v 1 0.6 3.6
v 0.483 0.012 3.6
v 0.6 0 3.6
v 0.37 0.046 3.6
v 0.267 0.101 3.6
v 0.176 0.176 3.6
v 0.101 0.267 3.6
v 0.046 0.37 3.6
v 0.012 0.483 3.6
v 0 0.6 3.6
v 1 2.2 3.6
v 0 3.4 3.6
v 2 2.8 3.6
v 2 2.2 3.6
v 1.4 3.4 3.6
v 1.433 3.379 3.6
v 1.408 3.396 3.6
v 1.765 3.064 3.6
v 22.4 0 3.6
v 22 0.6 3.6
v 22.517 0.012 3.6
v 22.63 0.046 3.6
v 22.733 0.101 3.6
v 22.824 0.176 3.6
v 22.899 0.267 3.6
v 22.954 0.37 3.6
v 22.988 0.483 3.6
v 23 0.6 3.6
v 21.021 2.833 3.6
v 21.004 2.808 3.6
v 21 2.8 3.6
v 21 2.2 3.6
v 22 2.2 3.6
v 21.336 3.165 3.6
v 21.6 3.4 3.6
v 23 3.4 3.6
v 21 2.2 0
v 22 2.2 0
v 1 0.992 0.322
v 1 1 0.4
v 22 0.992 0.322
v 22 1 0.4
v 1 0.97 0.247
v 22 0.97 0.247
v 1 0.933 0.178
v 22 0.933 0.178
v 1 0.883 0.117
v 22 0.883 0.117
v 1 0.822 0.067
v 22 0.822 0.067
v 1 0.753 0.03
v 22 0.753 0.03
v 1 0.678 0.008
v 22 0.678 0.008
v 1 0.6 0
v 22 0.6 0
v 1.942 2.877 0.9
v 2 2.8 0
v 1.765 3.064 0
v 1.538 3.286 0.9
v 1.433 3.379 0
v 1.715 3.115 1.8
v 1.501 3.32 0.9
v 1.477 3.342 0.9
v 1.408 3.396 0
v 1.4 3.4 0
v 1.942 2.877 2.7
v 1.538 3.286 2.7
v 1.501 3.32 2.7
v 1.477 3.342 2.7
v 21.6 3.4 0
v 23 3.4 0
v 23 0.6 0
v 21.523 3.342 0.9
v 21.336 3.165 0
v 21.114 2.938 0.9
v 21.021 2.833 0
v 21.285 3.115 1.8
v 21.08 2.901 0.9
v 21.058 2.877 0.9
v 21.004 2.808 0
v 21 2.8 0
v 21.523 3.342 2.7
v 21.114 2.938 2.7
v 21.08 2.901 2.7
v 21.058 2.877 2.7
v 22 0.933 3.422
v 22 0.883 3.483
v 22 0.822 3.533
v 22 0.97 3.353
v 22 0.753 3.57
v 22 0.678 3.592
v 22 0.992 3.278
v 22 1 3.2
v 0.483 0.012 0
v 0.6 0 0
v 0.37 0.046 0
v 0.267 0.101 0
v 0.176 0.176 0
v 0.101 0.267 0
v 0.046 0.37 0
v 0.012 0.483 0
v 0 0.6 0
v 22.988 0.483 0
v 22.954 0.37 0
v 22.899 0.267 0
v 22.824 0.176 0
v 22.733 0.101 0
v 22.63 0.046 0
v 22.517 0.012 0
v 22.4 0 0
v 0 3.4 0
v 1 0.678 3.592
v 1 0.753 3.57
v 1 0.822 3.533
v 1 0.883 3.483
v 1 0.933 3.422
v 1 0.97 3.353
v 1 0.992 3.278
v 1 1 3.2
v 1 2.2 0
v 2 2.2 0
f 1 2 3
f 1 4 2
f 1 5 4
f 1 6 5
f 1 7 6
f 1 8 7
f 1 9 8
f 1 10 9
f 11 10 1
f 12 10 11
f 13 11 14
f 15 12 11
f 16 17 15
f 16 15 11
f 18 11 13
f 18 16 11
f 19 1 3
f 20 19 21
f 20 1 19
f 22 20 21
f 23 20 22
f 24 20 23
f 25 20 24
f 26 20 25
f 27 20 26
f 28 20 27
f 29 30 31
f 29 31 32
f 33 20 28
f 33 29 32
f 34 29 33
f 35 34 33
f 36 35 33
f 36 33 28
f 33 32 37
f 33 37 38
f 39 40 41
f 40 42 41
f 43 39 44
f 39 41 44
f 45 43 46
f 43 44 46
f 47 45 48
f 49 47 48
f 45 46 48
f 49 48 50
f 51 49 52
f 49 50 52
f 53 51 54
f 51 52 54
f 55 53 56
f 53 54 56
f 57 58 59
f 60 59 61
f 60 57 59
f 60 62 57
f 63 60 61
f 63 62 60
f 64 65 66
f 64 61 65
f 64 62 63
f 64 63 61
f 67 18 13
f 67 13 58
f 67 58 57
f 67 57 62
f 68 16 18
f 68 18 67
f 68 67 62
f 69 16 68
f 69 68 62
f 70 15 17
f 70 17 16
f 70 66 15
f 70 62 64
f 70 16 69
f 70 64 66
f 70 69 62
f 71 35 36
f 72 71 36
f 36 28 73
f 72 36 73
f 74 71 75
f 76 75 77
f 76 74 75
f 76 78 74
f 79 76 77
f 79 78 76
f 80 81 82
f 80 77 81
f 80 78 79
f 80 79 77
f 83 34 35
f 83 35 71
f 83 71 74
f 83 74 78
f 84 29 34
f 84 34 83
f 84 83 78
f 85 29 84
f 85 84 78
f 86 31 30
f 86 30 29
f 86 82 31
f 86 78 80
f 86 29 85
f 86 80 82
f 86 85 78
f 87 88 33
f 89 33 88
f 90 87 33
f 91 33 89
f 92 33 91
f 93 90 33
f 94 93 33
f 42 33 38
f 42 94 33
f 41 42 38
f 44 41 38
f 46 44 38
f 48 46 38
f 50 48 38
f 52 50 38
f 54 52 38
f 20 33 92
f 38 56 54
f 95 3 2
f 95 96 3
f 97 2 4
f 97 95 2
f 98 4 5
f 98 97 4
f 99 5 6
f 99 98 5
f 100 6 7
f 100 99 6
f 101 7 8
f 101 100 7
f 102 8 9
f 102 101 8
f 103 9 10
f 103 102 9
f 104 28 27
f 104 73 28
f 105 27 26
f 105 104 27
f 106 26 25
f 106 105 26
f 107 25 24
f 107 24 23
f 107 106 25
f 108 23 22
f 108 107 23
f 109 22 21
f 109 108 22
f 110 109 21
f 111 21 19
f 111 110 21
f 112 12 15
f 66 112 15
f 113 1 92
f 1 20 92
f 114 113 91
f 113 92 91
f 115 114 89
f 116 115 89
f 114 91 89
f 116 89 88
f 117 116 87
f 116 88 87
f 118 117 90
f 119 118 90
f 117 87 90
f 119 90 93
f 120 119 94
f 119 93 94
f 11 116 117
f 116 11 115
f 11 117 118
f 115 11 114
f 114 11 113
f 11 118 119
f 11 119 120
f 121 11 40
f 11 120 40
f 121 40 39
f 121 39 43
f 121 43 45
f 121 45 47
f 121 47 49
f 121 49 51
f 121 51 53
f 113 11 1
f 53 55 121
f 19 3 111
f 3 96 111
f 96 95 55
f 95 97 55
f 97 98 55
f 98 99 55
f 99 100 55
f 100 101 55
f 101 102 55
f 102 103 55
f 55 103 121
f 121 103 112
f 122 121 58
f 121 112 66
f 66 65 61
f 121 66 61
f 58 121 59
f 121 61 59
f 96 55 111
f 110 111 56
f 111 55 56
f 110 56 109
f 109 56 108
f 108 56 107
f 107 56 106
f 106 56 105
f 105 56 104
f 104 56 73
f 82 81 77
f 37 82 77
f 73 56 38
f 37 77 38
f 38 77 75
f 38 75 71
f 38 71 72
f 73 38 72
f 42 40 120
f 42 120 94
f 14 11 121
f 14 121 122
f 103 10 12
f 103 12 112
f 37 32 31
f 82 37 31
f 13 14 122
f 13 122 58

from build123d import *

# Parameters (mm, degrees)
SKETCH1_W           = 23
SKETCH1_H           = 3.6
BOSS_EXTRUDE1_DEPTH = 1
SKETCH2_W           = 1
SKETCH2_H           = 3.6
BOSS_EXTRUDE2_DEPTH = 2.4
SKETCH3_W           = 1
SKETCH3_H           = 1.2
BOSS_EXTRUDE3_DEPTH = 3.6
FILLET1_SIZE        = 0.6
FILLET2_R           = 0.6
FILLET3_R           = 0.4


with BuildPart() as part:
    # Sketch1 → Boss-Extrude1 (new body)
    with BuildSketch(Plane(origin=(0, 0, 0), x_dir=(1, 0, 0), z_dir=(0, 1, 0))):
        with Locations((11.5, -1.8)):
            Rectangle(SKETCH1_W, SKETCH1_H)
    extrude(amount=BOSS_EXTRUDE1_DEPTH)

    # Sketch2 → Boss-Extrude2 (add)
    with BuildSketch(Plane(origin=(0, 1, 0), x_dir=(1, 0, 0), z_dir=(0, 1, 0))):
        with Locations((0.5, -1.8)):
            Rectangle(SKETCH2_W, SKETCH2_H)
        with Locations((22.5, -1.8)):
            Rectangle(SKETCH2_W, SKETCH2_H)
    extrude(amount=BOSS_EXTRUDE2_DEPTH)

    # Sketch3 → Boss-Extrude3 (add)
    with BuildSketch(Plane.XY.offset(3.6)):
        with Locations((1.5, 2.8)):
            Rectangle(SKETCH3_W, SKETCH3_H)
        with Locations((21.5, 2.8)):
            Rectangle(SKETCH3_W, SKETCH3_H)
    extrude(amount=-BOSS_EXTRUDE3_DEPTH)

    # Fillet1
    # a fillet whose section is not a circle: 0.6 mm, written as the material it takes off along each edge
    with BuildSketch(Plane(origin=(21, 3.4, 5.1), x_dir=(1, 0, 0), z_dir=(0, 0, -1)), Plane(origin=(2, 3.4, 5.1), x_dir=(0, -1, 0), z_dir=(0, 0, -1))) as fillet1_piece_1:
        with BuildLine():
            Bezier((FILLET1_SIZE, 0), (0, 0), (0, FILLET1_SIZE), weights=[1, 0.052631579, 1])
            Line((0, FILLET1_SIZE), (0, 0))
            Line((0, 0), (FILLET1_SIZE, 0))
        make_face()
    extrude(amount=6.6, mode=Mode.SUBTRACT)

    # Fillet2
    fillet2_edges = [part.edges().sort_by_distance(p)[0] for p in [
        (23, 0, 1.8),
        (0, 0, 1.8),
    ]]
    fillet(fillet2_edges, radius=FILLET2_R)

    # Fillet3
    fillet3_edges = [part.edges().sort_by_distance(p)[0] for p in [
        (11.5, 1, 3.6),
        (11.5, 1, 0),
    ]]
    fillet(fillet3_edges, radius=FILLET3_R)


solid = part.part
